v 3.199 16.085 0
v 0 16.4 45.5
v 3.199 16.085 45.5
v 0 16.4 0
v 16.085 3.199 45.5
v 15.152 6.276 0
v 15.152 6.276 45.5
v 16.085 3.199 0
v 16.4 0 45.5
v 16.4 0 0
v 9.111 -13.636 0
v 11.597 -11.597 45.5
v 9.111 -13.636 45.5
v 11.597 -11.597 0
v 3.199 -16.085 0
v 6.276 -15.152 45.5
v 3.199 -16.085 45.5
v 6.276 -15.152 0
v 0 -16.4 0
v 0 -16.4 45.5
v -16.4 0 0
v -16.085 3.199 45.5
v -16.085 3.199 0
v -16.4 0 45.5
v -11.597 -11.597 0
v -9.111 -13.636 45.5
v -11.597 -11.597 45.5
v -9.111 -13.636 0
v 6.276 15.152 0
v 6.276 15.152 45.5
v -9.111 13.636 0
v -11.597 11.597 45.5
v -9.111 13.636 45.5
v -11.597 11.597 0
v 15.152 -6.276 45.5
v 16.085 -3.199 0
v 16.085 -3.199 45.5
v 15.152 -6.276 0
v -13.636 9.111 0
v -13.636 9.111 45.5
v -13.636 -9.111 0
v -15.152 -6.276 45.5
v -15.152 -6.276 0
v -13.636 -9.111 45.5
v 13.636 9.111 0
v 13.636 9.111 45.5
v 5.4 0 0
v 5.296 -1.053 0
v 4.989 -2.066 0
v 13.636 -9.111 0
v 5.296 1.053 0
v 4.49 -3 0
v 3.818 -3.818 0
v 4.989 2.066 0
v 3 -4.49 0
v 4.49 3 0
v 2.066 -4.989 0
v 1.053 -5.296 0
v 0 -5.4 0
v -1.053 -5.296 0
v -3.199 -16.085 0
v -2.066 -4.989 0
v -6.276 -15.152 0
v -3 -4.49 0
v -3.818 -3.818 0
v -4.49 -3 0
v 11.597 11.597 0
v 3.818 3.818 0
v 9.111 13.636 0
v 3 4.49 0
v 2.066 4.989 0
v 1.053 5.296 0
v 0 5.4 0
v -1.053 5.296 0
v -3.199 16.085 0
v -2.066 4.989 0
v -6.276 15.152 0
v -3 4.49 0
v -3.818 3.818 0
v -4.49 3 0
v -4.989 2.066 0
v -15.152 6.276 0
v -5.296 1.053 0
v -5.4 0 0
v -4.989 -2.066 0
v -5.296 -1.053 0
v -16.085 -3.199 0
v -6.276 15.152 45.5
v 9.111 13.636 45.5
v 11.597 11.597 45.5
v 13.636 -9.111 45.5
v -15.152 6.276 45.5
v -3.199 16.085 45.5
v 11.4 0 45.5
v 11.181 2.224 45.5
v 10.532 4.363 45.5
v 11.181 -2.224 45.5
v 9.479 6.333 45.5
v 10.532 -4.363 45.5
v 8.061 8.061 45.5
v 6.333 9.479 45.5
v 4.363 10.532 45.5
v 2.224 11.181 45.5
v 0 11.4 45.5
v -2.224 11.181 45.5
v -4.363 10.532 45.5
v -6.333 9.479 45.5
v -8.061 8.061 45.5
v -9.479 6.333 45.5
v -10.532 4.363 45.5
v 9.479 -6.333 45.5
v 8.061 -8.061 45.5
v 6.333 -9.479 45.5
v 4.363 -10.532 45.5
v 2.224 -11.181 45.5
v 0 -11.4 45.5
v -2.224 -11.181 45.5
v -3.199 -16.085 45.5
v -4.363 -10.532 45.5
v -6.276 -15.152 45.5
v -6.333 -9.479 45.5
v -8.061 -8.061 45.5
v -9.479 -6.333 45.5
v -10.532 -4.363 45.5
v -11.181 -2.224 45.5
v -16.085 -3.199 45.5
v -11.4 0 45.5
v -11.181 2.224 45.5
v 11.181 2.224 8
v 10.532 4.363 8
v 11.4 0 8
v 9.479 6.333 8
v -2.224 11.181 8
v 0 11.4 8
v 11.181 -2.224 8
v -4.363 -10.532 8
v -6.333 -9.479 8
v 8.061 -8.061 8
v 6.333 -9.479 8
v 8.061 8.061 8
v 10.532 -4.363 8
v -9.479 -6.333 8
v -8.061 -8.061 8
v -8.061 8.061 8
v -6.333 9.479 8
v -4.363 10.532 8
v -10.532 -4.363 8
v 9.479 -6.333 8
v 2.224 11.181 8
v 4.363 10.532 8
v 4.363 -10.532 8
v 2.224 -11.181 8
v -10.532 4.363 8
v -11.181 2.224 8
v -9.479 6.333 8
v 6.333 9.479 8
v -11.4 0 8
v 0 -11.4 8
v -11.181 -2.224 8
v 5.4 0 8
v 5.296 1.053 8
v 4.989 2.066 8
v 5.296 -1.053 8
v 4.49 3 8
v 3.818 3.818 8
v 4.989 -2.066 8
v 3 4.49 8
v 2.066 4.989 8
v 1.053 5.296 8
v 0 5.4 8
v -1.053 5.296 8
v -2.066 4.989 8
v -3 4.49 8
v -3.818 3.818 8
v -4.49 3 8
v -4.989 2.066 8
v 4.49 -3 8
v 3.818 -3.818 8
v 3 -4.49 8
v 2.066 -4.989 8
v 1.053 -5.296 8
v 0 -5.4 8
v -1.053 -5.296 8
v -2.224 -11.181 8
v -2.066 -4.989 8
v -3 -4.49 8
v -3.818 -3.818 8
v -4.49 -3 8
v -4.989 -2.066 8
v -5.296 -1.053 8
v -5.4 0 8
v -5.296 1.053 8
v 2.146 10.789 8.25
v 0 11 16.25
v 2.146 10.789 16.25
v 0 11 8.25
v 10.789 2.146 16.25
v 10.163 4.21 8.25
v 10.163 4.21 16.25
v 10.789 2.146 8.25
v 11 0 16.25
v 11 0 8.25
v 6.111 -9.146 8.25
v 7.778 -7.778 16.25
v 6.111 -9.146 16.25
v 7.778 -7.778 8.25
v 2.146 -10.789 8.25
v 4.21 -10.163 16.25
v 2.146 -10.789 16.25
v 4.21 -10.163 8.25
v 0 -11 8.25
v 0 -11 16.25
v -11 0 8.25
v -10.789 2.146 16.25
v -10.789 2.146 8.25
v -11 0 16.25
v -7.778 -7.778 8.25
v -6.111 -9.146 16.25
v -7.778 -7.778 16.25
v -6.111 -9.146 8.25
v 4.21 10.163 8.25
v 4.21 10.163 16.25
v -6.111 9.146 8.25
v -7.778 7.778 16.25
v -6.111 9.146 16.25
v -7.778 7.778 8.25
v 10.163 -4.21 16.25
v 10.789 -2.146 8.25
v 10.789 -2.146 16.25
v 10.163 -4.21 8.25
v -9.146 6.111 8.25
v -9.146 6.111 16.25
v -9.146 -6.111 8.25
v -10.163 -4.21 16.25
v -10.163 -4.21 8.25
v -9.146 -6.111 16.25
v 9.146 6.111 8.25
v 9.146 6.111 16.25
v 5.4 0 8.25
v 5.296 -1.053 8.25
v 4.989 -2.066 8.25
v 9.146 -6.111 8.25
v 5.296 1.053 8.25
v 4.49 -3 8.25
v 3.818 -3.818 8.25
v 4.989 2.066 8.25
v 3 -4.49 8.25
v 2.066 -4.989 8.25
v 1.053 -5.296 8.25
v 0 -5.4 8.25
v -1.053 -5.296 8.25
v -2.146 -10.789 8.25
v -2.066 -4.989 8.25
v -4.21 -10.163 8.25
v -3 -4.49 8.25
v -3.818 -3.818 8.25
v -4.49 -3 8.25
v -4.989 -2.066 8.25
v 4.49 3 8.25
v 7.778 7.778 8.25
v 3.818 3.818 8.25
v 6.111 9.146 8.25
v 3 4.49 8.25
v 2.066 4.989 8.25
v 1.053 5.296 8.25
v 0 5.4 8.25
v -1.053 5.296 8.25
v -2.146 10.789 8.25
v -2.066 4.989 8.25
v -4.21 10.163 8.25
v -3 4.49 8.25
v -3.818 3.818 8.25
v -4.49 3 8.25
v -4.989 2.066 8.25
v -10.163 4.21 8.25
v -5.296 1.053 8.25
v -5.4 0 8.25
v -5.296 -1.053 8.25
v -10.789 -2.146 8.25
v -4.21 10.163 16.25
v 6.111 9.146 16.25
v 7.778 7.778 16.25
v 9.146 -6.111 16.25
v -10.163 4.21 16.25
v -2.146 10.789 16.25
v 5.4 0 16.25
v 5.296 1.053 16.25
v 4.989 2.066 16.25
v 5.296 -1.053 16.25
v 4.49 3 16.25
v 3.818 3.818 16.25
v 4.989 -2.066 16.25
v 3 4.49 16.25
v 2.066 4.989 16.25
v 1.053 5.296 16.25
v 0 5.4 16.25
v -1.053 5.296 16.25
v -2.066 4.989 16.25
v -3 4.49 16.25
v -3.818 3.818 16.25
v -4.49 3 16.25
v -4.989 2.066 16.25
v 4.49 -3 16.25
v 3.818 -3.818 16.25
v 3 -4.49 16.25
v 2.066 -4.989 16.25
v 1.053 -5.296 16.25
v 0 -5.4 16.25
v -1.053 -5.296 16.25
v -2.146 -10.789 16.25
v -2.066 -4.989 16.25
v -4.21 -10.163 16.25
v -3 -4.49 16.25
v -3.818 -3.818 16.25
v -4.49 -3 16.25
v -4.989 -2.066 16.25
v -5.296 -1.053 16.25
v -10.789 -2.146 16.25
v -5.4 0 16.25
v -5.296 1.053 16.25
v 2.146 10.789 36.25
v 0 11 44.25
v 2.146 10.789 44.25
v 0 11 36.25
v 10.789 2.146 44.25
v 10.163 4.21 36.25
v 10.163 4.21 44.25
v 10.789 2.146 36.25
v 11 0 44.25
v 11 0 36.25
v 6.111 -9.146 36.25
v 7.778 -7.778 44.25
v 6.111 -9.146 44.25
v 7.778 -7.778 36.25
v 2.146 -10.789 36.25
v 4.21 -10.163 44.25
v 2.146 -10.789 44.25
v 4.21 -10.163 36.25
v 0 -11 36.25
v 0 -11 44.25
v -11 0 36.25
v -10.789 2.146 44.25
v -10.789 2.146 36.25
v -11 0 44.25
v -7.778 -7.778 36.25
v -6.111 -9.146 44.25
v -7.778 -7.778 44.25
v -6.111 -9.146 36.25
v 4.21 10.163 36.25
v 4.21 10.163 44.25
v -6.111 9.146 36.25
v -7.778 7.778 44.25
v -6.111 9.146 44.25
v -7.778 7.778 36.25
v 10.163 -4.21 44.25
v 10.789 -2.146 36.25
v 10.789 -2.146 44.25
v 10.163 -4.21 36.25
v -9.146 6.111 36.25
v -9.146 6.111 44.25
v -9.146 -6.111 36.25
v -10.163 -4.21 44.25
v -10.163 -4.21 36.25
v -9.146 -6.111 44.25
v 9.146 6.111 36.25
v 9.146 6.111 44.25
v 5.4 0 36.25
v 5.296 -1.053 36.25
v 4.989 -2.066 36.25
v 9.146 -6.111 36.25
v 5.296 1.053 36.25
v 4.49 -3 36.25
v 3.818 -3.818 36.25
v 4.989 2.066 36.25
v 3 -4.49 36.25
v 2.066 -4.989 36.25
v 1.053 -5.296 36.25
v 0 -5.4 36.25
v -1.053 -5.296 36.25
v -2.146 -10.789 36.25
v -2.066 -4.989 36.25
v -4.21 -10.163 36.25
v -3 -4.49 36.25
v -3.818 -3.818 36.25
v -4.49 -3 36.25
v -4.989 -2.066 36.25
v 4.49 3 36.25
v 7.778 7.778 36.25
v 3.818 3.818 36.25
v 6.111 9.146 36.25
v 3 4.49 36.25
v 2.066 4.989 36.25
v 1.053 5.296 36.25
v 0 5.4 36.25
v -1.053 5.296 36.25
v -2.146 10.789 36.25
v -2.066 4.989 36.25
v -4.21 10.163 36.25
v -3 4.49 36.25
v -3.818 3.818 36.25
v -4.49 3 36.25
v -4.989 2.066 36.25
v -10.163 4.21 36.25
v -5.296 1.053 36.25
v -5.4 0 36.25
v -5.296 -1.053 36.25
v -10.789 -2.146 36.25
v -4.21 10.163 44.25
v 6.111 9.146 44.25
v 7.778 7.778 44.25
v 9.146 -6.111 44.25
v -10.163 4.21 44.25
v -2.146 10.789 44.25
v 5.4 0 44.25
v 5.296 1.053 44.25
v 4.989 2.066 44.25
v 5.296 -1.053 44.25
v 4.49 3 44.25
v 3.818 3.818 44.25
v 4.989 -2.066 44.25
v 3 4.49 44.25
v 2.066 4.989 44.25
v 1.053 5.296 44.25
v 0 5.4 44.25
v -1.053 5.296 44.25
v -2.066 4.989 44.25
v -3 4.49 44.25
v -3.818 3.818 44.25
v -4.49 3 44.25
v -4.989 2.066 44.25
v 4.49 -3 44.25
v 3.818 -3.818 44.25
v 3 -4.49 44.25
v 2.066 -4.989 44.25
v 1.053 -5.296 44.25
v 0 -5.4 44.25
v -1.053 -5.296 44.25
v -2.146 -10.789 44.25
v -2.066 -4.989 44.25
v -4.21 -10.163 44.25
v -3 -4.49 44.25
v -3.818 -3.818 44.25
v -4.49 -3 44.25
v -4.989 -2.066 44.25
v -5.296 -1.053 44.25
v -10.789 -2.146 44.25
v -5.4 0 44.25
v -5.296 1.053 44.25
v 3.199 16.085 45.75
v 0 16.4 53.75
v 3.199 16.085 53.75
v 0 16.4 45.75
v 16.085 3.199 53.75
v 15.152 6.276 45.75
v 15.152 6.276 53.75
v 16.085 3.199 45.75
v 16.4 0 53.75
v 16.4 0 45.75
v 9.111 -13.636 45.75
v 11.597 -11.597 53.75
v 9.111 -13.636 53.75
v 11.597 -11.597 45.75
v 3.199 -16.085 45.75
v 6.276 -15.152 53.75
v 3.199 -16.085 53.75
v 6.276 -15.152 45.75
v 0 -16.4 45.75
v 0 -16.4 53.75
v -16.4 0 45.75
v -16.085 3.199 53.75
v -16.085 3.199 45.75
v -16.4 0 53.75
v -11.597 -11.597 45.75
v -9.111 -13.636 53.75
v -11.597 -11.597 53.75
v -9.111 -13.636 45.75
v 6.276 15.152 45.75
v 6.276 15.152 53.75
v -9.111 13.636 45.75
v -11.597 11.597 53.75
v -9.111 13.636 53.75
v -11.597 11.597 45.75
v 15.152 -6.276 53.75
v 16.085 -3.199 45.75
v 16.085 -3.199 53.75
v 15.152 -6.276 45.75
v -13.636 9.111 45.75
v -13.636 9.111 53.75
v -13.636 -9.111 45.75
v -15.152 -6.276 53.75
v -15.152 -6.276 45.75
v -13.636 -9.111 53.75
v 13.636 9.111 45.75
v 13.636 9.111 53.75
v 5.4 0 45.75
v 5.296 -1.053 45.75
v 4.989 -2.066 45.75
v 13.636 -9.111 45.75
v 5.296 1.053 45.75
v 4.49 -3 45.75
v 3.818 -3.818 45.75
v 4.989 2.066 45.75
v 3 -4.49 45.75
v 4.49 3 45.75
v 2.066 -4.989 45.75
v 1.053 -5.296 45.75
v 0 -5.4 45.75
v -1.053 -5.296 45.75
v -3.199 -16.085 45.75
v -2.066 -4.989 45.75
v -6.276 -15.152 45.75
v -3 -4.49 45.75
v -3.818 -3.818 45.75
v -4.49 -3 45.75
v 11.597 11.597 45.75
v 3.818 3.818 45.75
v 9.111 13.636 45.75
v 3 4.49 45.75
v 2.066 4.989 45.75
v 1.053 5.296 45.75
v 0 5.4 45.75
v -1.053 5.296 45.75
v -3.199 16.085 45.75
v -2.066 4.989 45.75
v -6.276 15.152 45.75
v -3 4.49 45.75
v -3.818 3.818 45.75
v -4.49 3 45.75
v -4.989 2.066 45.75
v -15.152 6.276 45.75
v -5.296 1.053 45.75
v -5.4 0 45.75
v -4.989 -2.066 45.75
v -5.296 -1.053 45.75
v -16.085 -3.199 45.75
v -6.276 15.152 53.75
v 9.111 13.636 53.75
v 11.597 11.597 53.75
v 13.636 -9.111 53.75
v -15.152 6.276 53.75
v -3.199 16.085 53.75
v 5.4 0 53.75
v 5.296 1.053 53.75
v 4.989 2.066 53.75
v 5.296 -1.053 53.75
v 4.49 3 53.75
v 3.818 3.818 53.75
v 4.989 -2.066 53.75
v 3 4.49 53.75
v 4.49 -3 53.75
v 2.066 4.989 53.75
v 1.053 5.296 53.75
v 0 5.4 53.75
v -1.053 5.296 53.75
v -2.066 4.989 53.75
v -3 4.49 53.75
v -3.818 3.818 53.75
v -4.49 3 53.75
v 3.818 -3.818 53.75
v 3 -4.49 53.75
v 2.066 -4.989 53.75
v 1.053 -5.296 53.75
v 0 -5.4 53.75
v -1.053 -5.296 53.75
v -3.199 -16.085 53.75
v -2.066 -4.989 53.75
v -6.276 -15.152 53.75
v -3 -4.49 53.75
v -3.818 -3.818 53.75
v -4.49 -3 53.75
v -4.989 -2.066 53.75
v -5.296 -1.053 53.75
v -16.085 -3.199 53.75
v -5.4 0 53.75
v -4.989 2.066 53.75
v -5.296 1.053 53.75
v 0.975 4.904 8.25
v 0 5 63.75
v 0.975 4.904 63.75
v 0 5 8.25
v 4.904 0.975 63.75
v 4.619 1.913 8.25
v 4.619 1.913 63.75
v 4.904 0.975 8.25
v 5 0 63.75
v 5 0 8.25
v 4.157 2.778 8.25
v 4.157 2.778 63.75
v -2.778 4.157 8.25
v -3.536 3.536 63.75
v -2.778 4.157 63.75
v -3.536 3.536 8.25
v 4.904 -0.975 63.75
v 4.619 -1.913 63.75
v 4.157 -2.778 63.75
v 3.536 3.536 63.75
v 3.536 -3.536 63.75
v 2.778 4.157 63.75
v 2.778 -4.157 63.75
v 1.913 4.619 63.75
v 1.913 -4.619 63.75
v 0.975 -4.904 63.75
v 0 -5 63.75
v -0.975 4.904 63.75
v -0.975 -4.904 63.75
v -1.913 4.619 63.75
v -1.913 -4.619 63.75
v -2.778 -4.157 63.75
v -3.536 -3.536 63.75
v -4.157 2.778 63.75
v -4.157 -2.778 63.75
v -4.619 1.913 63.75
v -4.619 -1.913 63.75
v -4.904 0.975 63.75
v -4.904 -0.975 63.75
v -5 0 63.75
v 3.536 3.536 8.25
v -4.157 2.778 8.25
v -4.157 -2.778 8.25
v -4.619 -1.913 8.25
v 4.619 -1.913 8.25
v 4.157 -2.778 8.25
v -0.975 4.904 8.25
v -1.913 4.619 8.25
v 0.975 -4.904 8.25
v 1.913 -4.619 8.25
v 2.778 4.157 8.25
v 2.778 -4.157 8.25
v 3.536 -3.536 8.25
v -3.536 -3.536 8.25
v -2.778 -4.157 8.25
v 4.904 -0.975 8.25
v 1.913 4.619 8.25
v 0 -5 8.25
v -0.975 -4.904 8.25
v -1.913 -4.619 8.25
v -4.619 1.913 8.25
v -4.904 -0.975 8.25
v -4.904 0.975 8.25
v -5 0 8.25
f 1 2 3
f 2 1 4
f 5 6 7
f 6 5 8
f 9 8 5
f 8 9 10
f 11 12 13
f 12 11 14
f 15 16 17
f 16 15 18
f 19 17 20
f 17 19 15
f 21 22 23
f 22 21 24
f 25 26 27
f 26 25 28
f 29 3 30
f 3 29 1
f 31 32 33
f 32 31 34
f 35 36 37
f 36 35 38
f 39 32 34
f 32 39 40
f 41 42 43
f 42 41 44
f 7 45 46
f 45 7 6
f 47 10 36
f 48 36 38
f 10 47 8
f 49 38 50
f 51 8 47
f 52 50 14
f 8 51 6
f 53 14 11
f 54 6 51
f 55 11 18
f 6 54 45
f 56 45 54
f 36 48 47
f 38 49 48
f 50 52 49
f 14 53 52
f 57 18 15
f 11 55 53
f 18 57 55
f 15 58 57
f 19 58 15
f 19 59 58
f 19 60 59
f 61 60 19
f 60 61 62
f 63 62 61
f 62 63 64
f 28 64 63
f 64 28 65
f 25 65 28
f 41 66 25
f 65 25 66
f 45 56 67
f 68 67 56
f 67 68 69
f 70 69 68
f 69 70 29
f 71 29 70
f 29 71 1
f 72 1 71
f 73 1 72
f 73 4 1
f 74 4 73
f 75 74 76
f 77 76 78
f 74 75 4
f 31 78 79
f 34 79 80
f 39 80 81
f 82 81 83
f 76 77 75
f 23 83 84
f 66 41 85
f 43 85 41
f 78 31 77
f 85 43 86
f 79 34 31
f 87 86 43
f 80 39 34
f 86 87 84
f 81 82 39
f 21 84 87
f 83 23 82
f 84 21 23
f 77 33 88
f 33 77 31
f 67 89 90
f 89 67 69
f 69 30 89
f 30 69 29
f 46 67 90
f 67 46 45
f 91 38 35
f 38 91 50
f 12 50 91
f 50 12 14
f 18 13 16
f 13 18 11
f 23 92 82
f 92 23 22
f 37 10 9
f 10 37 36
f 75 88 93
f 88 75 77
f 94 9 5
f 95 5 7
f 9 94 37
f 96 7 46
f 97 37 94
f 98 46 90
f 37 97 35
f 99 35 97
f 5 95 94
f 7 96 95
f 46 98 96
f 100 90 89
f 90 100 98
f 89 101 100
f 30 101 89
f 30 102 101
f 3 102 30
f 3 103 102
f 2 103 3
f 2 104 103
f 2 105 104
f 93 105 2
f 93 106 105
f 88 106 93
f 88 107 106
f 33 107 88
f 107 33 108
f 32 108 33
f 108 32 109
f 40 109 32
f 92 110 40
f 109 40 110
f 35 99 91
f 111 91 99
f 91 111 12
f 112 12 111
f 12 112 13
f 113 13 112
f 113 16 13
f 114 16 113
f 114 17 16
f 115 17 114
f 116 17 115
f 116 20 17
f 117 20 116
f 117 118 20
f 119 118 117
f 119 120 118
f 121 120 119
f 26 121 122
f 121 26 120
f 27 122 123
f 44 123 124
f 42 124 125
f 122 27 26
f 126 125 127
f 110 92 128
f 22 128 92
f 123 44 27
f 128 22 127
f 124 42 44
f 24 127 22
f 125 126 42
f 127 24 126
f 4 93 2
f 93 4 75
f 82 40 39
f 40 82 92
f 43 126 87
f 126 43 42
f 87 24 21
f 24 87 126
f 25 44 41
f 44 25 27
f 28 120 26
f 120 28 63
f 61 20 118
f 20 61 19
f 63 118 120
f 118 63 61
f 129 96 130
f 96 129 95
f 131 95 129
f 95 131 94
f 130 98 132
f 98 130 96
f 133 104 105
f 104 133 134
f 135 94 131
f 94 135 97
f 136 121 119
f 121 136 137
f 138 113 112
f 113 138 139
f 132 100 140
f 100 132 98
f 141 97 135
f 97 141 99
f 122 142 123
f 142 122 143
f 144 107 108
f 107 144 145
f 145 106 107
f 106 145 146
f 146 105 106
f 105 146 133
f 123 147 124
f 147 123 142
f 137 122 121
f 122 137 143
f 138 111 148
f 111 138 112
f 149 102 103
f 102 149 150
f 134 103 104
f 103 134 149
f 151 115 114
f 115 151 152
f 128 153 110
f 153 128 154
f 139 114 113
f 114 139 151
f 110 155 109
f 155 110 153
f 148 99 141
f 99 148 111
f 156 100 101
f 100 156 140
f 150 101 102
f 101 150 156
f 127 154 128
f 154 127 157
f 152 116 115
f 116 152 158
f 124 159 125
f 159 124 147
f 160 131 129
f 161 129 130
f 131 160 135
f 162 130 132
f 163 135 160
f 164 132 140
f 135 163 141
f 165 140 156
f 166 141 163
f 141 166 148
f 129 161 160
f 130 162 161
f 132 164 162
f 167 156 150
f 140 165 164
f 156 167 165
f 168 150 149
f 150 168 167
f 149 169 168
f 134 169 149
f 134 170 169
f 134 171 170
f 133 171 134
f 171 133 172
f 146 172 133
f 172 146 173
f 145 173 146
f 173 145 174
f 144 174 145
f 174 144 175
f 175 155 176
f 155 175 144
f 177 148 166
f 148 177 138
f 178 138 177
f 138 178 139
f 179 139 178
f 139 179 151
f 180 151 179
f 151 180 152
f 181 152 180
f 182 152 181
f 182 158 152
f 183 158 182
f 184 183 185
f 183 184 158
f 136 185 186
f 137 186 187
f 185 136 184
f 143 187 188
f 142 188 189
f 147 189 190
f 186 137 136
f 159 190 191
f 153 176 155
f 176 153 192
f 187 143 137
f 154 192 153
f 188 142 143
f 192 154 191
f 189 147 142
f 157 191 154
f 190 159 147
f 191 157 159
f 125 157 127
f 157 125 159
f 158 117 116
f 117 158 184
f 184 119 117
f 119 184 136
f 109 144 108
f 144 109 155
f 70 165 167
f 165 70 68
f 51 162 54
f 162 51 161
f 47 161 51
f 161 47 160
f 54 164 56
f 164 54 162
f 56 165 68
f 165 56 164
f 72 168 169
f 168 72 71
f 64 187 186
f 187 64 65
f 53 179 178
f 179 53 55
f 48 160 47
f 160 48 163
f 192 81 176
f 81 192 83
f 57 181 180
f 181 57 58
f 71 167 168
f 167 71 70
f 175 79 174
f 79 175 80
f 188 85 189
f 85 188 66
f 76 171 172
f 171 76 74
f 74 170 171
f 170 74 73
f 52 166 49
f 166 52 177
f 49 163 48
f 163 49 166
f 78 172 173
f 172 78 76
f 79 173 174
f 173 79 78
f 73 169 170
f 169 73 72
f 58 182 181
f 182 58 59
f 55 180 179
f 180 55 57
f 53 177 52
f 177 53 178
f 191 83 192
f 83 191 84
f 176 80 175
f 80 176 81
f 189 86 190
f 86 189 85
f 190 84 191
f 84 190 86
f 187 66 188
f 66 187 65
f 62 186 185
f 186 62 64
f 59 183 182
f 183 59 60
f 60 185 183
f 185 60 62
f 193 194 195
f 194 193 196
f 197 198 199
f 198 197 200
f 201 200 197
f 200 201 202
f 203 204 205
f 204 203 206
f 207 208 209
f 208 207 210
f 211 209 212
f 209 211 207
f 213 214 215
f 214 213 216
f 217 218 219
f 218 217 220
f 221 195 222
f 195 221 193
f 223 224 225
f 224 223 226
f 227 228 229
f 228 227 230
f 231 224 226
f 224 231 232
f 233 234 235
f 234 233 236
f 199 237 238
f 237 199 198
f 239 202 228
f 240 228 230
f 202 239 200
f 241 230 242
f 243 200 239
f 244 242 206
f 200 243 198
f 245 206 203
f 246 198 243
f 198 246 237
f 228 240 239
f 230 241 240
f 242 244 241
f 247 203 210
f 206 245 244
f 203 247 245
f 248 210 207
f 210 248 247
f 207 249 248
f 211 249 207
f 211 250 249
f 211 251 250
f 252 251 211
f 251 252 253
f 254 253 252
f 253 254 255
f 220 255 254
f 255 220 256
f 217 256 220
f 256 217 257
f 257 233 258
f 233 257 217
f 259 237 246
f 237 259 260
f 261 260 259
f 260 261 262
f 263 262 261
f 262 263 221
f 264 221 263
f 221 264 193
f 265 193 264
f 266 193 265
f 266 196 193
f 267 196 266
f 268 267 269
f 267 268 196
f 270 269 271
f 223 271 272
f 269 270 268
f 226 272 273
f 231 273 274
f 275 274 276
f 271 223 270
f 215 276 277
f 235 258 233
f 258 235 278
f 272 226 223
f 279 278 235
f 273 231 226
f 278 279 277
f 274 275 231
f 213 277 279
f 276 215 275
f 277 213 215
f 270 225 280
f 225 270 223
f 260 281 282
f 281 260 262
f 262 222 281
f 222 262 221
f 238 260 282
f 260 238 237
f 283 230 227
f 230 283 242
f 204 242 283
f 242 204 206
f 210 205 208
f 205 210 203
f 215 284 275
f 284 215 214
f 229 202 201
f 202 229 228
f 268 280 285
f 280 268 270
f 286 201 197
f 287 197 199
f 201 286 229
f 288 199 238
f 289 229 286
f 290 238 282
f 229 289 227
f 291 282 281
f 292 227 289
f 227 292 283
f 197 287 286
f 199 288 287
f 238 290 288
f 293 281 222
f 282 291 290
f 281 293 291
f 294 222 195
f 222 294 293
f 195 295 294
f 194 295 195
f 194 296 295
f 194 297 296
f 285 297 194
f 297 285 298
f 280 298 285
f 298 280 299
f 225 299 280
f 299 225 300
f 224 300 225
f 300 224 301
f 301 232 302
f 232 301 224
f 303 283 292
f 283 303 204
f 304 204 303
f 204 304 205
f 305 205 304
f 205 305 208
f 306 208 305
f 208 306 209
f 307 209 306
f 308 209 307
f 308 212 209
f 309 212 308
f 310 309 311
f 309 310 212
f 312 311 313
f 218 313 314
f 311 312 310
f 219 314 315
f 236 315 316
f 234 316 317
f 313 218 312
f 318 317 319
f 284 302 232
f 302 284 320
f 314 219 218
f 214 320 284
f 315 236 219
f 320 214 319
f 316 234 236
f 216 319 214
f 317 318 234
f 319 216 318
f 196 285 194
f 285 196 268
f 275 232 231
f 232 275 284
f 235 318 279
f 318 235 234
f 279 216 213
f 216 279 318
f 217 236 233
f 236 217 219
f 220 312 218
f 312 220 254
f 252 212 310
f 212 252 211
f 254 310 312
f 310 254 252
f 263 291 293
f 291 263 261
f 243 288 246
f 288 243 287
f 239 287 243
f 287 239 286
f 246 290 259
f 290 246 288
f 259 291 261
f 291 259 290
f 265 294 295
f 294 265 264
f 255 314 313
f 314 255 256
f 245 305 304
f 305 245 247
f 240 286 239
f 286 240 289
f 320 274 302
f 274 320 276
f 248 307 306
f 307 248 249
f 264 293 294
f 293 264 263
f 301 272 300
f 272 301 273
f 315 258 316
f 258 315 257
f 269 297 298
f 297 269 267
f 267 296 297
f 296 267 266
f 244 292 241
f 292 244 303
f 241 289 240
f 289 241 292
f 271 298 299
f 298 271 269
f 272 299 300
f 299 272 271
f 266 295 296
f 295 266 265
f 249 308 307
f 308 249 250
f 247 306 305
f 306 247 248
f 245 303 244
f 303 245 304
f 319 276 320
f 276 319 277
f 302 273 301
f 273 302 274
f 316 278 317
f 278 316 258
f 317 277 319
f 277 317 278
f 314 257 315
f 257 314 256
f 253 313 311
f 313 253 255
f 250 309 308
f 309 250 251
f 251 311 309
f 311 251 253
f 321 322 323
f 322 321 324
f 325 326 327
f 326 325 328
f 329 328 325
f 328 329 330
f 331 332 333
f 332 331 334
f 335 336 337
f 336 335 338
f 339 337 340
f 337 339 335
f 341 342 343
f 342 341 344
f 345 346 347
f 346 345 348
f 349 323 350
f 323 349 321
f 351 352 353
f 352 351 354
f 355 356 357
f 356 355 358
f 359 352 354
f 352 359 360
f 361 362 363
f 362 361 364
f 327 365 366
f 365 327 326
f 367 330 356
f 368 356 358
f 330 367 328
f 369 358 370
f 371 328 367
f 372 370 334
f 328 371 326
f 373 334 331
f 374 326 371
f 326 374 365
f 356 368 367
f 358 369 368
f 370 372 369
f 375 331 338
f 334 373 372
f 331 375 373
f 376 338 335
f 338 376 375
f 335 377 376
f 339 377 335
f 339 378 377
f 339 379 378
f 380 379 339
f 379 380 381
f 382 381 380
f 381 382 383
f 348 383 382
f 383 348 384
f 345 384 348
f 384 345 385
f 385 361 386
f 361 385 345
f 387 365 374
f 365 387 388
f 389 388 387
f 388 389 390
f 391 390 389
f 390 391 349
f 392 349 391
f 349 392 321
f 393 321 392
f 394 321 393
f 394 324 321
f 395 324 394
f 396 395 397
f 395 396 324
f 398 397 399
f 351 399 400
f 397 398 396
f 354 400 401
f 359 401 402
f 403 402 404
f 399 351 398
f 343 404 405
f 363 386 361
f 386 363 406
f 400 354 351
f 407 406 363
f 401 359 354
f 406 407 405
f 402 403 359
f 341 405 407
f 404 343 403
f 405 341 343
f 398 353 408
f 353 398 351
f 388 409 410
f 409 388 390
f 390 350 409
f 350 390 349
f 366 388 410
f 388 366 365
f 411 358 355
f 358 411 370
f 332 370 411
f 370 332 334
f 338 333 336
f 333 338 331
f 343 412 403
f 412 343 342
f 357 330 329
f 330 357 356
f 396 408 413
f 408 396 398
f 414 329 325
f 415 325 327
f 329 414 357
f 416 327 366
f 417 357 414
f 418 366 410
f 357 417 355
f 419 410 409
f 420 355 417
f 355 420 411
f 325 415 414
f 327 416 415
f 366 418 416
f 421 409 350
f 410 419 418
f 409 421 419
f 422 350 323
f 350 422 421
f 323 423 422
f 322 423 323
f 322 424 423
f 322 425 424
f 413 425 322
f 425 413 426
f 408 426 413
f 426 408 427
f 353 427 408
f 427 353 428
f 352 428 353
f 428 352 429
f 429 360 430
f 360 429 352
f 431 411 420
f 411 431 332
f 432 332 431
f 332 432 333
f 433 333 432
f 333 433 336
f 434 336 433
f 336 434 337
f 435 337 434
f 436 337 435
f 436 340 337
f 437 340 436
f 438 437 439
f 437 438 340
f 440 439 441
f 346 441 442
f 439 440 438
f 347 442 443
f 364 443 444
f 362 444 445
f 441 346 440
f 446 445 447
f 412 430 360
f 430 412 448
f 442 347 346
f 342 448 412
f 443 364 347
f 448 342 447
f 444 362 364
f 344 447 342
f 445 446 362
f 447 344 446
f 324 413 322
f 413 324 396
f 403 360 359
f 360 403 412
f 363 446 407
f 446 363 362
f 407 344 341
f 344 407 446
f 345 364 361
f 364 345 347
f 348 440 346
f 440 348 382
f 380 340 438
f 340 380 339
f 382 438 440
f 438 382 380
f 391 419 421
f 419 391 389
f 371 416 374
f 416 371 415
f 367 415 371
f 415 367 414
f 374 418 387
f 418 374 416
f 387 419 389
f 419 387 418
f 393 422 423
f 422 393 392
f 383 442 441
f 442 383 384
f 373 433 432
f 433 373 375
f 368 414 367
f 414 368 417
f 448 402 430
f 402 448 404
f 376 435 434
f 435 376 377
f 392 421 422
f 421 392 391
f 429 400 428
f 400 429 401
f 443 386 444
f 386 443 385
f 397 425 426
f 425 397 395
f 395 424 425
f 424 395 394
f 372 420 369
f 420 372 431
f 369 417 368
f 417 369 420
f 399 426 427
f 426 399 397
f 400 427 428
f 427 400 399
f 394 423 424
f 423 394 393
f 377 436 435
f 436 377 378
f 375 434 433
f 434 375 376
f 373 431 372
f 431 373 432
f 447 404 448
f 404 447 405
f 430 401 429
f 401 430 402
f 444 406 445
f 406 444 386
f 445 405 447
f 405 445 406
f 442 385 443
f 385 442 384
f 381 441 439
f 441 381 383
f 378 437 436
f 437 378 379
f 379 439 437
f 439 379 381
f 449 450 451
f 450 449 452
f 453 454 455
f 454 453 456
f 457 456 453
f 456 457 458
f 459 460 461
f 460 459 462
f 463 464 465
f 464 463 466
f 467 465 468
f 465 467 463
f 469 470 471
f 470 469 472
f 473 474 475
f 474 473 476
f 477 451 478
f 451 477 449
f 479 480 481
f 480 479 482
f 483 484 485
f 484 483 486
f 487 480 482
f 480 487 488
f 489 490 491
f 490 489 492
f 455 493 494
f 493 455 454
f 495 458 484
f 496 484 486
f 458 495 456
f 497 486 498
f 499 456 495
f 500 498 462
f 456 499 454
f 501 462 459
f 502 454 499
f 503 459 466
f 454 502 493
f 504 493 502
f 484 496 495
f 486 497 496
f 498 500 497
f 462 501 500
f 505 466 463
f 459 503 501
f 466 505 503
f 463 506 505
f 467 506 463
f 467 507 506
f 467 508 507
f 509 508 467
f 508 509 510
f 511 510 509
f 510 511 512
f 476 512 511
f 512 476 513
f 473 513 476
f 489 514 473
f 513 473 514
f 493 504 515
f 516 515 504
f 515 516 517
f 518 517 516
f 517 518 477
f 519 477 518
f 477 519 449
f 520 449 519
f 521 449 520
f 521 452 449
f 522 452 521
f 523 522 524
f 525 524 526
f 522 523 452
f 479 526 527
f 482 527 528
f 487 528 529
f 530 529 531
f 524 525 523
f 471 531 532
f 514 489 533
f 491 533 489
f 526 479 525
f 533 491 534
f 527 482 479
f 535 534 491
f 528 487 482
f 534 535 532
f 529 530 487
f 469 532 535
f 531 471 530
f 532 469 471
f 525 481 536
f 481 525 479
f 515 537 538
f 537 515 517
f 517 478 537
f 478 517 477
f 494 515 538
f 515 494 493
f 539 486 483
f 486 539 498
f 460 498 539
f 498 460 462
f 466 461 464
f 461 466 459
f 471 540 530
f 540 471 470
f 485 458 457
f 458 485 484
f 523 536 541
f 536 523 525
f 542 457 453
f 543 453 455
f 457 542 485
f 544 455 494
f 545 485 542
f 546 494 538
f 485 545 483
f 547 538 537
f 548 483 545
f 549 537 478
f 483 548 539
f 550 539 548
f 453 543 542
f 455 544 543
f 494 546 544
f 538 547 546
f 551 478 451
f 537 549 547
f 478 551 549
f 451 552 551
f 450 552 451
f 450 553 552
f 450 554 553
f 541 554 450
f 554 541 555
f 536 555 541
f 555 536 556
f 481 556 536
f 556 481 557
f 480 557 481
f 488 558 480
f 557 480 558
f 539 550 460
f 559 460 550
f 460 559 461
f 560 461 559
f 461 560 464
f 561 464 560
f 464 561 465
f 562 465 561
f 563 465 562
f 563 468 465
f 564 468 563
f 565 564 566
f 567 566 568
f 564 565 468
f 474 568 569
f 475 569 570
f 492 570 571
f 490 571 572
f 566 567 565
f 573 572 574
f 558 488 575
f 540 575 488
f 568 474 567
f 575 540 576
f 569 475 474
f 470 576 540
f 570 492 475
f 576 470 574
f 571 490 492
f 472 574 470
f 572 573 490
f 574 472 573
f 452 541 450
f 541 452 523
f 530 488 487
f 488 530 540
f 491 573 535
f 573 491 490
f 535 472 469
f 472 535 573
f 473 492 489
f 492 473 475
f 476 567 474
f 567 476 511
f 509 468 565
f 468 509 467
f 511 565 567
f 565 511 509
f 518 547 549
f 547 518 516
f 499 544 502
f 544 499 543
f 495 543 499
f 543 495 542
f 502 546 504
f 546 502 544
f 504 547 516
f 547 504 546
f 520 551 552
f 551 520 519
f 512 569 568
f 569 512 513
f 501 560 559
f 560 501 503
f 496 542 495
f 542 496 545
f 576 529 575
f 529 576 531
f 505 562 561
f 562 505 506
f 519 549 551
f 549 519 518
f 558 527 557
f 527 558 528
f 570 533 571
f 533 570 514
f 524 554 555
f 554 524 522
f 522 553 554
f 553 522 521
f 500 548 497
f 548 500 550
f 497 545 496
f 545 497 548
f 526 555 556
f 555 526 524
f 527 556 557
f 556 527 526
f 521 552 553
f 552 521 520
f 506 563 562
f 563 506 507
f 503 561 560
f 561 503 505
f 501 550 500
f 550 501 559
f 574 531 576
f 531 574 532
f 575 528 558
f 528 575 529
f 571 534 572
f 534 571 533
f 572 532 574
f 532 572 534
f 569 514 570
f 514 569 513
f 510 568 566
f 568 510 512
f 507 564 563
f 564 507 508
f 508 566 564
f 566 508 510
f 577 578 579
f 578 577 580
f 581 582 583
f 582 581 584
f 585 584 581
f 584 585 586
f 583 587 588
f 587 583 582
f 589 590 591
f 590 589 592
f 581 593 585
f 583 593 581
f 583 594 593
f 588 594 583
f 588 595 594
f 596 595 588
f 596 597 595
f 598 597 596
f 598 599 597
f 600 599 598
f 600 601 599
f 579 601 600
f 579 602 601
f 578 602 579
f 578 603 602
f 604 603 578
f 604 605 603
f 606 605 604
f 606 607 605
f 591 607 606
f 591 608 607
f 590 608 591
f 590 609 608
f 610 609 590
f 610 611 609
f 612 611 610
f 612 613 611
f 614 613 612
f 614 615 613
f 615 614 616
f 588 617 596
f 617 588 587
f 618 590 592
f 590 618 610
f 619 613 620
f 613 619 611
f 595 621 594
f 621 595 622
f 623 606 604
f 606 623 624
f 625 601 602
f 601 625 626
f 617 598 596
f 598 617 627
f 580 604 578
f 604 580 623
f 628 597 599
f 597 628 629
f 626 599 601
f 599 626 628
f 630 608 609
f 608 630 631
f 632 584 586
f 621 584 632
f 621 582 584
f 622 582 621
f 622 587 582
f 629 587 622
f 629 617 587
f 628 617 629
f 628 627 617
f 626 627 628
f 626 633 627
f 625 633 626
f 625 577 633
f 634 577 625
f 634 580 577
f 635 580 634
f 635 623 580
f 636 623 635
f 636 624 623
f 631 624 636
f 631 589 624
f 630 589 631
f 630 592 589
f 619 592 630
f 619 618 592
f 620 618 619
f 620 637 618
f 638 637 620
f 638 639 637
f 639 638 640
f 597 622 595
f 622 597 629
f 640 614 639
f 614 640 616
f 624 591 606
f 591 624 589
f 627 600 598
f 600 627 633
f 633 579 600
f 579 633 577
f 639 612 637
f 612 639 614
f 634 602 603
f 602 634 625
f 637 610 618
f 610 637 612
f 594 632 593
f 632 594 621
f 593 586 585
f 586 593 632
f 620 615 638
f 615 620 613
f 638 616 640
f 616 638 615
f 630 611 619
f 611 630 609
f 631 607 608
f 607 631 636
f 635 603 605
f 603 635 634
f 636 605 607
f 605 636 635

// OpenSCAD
$fn = 32;

// ------------------------------------------------------------------------
// Shaft station: cup d32.8 x 45.5 mm, shaft d10
// Every part is its own module, assembly() places every instance.
// ------------------------------------------------------------------------

// --- part 1 ---
module housing_cup() {
  difference() {
    cylinder(h = 45.5, d = 32.8);
    translate([0, 0, 8]) cylinder(h = 38.5, d = 22.8);
    translate([0, 0, -1]) cylinder(h = 10, d = 10.8);
  }
}

// --- part 2 ---
module bearing_lower() {
  difference() {
      translate([0, 0, 0]) cylinder(h = 8, d = 22);
      translate([0, 0, -1]) cylinder(h = 10, d = 10.8);
    }
}

// --- part 3 ---
module bearing_upper() {
  difference() {
      translate([0, 0, 0]) cylinder(h = 8, d = 22);
      translate([0, 0, -1]) cylinder(h = 10, d = 10.8);
    }
}

// --- part 4 ---
module station_shaft() {
  translate([0, 0, -27.75]) cylinder(h = 55.5, d = 10);
}

// --- part 5 ---
module station_cover() {
  difference() {
    cylinder(h = 8, d = 32.8);
    translate([0, 0, -1]) cylinder(h = 10, d = 10.8);
  }
}

// --- assembly ---
module assembly() {
  color([0.80, 0.24, 0.20]) translate([0, 0, 0]) rotate([0, 0, 0]) housing_cup();
  color([0.20, 0.45, 0.75]) translate([0, 0, 8.25]) rotate([0, 0, 0]) bearing_lower();
  color([0.25, 0.62, 0.32]) translate([0, 0, 36.25]) rotate([0, 0, 0]) bearing_upper();
  color([0.92, 0.70, 0.18]) translate([0, 0, 36]) rotate([0, 0, 0]) station_shaft();
  color([0.58, 0.35, 0.70]) translate([0, 0, 45.75]) rotate([0, 0, 0]) station_cover();
}

assembly();
